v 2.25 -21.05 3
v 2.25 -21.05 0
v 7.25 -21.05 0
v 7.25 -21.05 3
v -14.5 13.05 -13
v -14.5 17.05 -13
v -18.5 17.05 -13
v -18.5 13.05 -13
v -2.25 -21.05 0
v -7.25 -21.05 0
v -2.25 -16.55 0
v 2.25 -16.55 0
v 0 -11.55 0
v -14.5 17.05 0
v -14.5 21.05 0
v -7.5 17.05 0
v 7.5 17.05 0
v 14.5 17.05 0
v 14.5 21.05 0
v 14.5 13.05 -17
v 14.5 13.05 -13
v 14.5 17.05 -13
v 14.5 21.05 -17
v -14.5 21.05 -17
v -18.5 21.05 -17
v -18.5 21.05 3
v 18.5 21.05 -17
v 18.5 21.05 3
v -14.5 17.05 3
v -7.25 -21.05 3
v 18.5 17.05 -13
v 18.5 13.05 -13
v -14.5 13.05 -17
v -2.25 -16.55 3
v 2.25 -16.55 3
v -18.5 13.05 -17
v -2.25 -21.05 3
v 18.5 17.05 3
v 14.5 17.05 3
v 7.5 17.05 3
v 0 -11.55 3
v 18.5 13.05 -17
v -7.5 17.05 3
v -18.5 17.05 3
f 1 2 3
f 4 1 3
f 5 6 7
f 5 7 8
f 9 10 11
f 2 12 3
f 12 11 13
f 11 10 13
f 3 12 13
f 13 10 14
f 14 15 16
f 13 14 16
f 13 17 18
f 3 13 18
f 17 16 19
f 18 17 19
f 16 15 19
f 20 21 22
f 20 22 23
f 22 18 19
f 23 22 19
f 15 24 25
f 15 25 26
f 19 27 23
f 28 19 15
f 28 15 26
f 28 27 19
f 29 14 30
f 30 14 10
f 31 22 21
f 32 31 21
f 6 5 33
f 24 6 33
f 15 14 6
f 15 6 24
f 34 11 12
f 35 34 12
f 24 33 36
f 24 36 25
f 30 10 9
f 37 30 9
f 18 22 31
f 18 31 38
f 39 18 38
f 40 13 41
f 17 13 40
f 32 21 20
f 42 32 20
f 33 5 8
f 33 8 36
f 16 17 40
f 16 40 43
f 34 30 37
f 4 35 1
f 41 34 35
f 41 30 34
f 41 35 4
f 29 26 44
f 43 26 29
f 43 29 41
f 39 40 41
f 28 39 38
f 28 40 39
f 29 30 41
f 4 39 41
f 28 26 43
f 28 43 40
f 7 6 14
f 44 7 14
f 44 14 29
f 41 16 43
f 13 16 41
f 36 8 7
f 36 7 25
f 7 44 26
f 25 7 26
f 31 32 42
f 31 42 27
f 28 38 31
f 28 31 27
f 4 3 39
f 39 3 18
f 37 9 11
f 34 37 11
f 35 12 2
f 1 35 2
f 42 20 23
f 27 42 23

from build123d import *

# Parameters (mm, degrees)
F1_DEPTH = 3
F3_START = 14.5
F2_W     = 4
F2_H     = 13
F3_DEPTH = 4
F6_DEPTH = 25


# Not quite as in the source:
# - a feature names something its author has since deleted; it is built from what else it names


with BuildPart() as f1:
    # F0 (on Top) → F1 (new body)
    with BuildSketch(Plane.XY):
        Polygon((-18.5, 17.05), (-14.5, 17.05), (14.5, 17.05), (18.5, 17.05), (18.5, 21.05), (-18.5, 21.05), align=None)
        Polygon((14.5, 17.05), (-14.5, 17.05), (-7.25, -21.05), (-2.25, -21.05), (-2.25, -16.55), (2.25, -16.55), (2.25, -21.05), (7.25, -21.05), align=None)
    extrude(amount=F1_DEPTH)

    # F2 (on Right) → F3 (join)
    with BuildSketch(Plane.YZ.offset(F3_START)):
        with Locations((19.05, -6.5)):
            Rectangle(F2_W, F2_H)
        Polygon((21.05, -17), (21.05, -13), (17.05, -13), (13.05, -13), (13.05, -17), align=None)
    extrude(amount=F3_DEPTH)

    # F4: F1 across plane


with BuildPart() as f1_1:
    add(f1.part)
    add(f1.part.mirror(Plane.YZ))

    # F5 (on Top) → F6 (cut)
    with BuildSketch(Plane.XY):
        Polygon((7.5, 17.05), (-7.5, 17.05), (0, -11.55), align=None)
    extrude(amount=F6_DEPTH, mode=Mode.SUBTRACT)


solid = f1_1.part
